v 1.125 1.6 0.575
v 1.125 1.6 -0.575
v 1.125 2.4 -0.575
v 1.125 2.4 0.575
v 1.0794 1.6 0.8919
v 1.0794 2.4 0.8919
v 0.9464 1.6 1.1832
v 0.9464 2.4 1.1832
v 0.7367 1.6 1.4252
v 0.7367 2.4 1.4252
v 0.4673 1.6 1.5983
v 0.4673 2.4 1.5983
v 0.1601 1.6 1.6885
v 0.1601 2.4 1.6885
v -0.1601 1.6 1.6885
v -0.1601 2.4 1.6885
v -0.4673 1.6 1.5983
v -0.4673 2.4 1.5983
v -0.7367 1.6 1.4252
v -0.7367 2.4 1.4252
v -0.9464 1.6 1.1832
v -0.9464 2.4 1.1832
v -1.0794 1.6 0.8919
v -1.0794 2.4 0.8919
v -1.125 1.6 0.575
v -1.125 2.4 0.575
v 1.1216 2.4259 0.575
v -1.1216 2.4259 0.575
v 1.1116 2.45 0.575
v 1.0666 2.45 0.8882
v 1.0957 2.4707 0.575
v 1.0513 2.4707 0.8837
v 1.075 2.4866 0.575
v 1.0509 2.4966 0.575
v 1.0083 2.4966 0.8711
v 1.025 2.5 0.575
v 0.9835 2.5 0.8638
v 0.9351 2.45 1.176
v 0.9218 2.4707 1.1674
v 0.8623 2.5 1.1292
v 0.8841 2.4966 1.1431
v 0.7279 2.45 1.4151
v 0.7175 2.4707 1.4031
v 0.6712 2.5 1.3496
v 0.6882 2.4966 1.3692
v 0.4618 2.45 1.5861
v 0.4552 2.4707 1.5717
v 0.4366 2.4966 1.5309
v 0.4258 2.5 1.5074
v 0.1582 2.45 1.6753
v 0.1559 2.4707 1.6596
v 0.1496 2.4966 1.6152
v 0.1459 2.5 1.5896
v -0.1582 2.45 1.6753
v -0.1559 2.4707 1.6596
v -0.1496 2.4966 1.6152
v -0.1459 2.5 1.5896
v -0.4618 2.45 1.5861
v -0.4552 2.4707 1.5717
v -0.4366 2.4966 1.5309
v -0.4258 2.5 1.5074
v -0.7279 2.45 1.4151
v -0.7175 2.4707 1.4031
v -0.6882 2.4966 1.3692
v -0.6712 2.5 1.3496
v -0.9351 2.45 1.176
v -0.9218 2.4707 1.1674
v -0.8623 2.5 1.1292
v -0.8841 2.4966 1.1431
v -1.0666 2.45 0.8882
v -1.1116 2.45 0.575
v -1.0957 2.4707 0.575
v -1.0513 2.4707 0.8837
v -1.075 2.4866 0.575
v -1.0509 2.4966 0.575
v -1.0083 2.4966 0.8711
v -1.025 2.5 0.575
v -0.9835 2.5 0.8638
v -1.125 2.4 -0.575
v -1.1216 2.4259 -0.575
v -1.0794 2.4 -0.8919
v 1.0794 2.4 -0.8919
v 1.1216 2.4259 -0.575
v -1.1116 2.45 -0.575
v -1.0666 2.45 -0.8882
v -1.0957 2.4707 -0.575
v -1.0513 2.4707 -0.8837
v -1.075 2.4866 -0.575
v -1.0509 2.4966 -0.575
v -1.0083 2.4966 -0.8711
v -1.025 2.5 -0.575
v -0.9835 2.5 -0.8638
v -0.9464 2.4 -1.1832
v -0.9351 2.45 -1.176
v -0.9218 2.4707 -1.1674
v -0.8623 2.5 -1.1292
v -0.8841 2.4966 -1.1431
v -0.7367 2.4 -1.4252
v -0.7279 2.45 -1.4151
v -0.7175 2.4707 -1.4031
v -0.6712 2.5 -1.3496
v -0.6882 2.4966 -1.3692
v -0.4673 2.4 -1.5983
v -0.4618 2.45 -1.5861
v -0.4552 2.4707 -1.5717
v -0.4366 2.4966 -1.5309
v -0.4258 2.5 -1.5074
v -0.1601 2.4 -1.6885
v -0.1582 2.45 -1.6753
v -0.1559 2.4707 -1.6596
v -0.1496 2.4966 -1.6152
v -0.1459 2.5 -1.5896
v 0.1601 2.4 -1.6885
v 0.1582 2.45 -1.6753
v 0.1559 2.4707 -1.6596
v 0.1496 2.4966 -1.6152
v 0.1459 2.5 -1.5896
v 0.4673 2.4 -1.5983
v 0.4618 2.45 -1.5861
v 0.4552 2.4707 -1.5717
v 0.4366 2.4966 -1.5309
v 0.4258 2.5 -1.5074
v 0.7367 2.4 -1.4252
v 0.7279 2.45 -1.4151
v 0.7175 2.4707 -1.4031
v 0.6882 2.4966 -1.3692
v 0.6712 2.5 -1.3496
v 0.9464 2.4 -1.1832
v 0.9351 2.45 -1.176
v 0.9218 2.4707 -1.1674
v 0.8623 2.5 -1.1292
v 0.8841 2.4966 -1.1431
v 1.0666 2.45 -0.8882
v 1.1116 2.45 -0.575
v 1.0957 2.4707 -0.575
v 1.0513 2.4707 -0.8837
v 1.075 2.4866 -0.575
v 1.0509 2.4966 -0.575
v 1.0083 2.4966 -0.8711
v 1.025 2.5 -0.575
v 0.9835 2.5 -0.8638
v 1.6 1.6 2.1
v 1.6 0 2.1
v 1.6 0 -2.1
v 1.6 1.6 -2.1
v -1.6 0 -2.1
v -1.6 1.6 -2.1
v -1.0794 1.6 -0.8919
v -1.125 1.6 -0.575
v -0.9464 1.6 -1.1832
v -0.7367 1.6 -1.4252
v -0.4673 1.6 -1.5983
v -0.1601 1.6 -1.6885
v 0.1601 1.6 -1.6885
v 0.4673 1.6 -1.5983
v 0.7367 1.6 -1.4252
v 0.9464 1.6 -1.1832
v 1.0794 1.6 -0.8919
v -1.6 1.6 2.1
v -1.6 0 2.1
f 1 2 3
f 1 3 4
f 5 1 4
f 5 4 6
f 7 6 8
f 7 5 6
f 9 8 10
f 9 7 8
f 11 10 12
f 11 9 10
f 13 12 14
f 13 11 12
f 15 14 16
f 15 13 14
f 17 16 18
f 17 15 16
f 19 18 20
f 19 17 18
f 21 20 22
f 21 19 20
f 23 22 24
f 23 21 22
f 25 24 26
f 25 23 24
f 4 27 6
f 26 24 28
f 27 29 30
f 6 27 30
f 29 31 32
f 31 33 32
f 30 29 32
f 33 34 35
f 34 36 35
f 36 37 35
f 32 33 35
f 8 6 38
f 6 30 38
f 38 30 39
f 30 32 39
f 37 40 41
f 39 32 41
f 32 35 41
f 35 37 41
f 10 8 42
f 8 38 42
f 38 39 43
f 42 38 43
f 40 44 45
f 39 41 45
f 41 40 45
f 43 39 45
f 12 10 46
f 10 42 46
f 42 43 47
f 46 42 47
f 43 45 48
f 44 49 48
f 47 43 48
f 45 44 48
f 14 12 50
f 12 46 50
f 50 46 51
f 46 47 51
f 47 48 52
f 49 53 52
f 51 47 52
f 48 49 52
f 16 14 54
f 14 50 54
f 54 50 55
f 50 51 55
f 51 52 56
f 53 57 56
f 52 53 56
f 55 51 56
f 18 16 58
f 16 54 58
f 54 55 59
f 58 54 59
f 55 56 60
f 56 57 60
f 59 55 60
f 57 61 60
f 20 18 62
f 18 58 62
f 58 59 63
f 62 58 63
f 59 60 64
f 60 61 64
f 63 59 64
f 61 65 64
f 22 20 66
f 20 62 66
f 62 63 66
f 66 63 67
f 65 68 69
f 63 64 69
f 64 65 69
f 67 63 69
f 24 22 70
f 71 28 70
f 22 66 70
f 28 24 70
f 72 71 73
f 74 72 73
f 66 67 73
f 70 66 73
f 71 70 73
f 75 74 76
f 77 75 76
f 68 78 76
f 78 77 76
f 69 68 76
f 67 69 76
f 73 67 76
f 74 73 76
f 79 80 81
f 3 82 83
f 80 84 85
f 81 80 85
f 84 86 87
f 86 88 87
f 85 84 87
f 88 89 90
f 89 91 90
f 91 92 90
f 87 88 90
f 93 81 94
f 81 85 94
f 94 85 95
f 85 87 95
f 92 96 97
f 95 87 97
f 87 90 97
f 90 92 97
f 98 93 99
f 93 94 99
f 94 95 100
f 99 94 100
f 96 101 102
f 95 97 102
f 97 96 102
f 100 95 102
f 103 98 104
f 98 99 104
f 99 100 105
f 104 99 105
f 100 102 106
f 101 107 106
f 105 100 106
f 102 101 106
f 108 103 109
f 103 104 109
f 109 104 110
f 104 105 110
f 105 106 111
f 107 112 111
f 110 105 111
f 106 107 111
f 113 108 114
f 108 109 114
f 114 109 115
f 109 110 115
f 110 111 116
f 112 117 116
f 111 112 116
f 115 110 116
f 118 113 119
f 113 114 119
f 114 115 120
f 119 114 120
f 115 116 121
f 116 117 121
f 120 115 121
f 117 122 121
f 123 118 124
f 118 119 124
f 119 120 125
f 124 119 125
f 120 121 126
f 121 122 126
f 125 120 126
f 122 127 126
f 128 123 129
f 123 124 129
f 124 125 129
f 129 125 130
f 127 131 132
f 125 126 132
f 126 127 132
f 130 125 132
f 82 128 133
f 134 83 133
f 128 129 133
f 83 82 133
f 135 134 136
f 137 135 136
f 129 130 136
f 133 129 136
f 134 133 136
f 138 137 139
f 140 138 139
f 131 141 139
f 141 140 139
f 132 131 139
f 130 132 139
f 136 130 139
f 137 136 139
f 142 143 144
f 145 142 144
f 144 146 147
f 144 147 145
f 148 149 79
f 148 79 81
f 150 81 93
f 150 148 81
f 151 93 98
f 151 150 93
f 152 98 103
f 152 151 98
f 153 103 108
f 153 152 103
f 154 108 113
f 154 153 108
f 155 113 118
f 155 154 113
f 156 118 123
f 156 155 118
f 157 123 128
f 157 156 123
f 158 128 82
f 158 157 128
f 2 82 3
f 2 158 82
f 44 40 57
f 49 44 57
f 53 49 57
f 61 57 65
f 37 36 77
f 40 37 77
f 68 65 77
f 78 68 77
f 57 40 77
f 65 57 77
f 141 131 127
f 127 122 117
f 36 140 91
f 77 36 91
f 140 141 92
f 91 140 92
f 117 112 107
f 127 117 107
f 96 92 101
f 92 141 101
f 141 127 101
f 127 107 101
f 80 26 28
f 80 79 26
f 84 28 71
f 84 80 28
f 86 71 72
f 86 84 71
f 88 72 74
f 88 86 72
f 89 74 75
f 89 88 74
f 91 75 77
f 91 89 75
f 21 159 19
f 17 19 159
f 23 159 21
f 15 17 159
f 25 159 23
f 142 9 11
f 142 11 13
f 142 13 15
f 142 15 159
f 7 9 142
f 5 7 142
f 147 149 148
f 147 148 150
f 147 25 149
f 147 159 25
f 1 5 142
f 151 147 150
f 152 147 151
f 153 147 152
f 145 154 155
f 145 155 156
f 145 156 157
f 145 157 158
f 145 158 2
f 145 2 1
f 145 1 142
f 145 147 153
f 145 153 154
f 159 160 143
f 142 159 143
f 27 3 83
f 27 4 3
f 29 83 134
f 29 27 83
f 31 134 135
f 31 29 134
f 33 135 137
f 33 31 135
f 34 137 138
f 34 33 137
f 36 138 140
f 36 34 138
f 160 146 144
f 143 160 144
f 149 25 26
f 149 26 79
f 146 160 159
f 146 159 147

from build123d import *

# Parameters (mm, degrees)
BASES_W      = 3.2
BASES_H      = 4.2
BASE_DEPTH   = 1.6
BUTTON_DEPTH = 0.9
BF_R         = 0.1


with BuildPart() as part:
    # BaseS → Base (new body)
    with BuildSketch(Plane(origin=(0, 0, 0), x_dir=(1, 0, 0), z_dir=(0, 1, 0))):
        Rectangle(BASES_W, BASES_H)
    extrude(amount=BASE_DEPTH)

    # ButtonS → Button (add)
    with BuildSketch(Plane(origin=(0, 1.6, 0), x_dir=(1, 0, 0), z_dir=(0, 1, 0))):
        with BuildLine():
            Line((1.125, 0.575), (1.125, -0.575))
            ThreePointArc((1.125, -0.575), (0, -1.7), (-1.125, -0.575))
            Line((-1.125, -0.575), (-1.125, 0.575))
            ThreePointArc((-1.125, 0.575), (0, 1.7), (1.125, 0.575))
        make_face()
    extrude(amount=BUTTON_DEPTH)

    # BF
    bf_edges = [part.edges().sort_by_distance(p)[0] for p in [
        (0, 2.5, -1.7),
        (-1.125, 2.5, 0),
        (0, 2.5, 1.7),
        (1.125, 2.5, 0),
    ]]
    fillet(bf_edges, radius=BF_R)


solid = part.part
